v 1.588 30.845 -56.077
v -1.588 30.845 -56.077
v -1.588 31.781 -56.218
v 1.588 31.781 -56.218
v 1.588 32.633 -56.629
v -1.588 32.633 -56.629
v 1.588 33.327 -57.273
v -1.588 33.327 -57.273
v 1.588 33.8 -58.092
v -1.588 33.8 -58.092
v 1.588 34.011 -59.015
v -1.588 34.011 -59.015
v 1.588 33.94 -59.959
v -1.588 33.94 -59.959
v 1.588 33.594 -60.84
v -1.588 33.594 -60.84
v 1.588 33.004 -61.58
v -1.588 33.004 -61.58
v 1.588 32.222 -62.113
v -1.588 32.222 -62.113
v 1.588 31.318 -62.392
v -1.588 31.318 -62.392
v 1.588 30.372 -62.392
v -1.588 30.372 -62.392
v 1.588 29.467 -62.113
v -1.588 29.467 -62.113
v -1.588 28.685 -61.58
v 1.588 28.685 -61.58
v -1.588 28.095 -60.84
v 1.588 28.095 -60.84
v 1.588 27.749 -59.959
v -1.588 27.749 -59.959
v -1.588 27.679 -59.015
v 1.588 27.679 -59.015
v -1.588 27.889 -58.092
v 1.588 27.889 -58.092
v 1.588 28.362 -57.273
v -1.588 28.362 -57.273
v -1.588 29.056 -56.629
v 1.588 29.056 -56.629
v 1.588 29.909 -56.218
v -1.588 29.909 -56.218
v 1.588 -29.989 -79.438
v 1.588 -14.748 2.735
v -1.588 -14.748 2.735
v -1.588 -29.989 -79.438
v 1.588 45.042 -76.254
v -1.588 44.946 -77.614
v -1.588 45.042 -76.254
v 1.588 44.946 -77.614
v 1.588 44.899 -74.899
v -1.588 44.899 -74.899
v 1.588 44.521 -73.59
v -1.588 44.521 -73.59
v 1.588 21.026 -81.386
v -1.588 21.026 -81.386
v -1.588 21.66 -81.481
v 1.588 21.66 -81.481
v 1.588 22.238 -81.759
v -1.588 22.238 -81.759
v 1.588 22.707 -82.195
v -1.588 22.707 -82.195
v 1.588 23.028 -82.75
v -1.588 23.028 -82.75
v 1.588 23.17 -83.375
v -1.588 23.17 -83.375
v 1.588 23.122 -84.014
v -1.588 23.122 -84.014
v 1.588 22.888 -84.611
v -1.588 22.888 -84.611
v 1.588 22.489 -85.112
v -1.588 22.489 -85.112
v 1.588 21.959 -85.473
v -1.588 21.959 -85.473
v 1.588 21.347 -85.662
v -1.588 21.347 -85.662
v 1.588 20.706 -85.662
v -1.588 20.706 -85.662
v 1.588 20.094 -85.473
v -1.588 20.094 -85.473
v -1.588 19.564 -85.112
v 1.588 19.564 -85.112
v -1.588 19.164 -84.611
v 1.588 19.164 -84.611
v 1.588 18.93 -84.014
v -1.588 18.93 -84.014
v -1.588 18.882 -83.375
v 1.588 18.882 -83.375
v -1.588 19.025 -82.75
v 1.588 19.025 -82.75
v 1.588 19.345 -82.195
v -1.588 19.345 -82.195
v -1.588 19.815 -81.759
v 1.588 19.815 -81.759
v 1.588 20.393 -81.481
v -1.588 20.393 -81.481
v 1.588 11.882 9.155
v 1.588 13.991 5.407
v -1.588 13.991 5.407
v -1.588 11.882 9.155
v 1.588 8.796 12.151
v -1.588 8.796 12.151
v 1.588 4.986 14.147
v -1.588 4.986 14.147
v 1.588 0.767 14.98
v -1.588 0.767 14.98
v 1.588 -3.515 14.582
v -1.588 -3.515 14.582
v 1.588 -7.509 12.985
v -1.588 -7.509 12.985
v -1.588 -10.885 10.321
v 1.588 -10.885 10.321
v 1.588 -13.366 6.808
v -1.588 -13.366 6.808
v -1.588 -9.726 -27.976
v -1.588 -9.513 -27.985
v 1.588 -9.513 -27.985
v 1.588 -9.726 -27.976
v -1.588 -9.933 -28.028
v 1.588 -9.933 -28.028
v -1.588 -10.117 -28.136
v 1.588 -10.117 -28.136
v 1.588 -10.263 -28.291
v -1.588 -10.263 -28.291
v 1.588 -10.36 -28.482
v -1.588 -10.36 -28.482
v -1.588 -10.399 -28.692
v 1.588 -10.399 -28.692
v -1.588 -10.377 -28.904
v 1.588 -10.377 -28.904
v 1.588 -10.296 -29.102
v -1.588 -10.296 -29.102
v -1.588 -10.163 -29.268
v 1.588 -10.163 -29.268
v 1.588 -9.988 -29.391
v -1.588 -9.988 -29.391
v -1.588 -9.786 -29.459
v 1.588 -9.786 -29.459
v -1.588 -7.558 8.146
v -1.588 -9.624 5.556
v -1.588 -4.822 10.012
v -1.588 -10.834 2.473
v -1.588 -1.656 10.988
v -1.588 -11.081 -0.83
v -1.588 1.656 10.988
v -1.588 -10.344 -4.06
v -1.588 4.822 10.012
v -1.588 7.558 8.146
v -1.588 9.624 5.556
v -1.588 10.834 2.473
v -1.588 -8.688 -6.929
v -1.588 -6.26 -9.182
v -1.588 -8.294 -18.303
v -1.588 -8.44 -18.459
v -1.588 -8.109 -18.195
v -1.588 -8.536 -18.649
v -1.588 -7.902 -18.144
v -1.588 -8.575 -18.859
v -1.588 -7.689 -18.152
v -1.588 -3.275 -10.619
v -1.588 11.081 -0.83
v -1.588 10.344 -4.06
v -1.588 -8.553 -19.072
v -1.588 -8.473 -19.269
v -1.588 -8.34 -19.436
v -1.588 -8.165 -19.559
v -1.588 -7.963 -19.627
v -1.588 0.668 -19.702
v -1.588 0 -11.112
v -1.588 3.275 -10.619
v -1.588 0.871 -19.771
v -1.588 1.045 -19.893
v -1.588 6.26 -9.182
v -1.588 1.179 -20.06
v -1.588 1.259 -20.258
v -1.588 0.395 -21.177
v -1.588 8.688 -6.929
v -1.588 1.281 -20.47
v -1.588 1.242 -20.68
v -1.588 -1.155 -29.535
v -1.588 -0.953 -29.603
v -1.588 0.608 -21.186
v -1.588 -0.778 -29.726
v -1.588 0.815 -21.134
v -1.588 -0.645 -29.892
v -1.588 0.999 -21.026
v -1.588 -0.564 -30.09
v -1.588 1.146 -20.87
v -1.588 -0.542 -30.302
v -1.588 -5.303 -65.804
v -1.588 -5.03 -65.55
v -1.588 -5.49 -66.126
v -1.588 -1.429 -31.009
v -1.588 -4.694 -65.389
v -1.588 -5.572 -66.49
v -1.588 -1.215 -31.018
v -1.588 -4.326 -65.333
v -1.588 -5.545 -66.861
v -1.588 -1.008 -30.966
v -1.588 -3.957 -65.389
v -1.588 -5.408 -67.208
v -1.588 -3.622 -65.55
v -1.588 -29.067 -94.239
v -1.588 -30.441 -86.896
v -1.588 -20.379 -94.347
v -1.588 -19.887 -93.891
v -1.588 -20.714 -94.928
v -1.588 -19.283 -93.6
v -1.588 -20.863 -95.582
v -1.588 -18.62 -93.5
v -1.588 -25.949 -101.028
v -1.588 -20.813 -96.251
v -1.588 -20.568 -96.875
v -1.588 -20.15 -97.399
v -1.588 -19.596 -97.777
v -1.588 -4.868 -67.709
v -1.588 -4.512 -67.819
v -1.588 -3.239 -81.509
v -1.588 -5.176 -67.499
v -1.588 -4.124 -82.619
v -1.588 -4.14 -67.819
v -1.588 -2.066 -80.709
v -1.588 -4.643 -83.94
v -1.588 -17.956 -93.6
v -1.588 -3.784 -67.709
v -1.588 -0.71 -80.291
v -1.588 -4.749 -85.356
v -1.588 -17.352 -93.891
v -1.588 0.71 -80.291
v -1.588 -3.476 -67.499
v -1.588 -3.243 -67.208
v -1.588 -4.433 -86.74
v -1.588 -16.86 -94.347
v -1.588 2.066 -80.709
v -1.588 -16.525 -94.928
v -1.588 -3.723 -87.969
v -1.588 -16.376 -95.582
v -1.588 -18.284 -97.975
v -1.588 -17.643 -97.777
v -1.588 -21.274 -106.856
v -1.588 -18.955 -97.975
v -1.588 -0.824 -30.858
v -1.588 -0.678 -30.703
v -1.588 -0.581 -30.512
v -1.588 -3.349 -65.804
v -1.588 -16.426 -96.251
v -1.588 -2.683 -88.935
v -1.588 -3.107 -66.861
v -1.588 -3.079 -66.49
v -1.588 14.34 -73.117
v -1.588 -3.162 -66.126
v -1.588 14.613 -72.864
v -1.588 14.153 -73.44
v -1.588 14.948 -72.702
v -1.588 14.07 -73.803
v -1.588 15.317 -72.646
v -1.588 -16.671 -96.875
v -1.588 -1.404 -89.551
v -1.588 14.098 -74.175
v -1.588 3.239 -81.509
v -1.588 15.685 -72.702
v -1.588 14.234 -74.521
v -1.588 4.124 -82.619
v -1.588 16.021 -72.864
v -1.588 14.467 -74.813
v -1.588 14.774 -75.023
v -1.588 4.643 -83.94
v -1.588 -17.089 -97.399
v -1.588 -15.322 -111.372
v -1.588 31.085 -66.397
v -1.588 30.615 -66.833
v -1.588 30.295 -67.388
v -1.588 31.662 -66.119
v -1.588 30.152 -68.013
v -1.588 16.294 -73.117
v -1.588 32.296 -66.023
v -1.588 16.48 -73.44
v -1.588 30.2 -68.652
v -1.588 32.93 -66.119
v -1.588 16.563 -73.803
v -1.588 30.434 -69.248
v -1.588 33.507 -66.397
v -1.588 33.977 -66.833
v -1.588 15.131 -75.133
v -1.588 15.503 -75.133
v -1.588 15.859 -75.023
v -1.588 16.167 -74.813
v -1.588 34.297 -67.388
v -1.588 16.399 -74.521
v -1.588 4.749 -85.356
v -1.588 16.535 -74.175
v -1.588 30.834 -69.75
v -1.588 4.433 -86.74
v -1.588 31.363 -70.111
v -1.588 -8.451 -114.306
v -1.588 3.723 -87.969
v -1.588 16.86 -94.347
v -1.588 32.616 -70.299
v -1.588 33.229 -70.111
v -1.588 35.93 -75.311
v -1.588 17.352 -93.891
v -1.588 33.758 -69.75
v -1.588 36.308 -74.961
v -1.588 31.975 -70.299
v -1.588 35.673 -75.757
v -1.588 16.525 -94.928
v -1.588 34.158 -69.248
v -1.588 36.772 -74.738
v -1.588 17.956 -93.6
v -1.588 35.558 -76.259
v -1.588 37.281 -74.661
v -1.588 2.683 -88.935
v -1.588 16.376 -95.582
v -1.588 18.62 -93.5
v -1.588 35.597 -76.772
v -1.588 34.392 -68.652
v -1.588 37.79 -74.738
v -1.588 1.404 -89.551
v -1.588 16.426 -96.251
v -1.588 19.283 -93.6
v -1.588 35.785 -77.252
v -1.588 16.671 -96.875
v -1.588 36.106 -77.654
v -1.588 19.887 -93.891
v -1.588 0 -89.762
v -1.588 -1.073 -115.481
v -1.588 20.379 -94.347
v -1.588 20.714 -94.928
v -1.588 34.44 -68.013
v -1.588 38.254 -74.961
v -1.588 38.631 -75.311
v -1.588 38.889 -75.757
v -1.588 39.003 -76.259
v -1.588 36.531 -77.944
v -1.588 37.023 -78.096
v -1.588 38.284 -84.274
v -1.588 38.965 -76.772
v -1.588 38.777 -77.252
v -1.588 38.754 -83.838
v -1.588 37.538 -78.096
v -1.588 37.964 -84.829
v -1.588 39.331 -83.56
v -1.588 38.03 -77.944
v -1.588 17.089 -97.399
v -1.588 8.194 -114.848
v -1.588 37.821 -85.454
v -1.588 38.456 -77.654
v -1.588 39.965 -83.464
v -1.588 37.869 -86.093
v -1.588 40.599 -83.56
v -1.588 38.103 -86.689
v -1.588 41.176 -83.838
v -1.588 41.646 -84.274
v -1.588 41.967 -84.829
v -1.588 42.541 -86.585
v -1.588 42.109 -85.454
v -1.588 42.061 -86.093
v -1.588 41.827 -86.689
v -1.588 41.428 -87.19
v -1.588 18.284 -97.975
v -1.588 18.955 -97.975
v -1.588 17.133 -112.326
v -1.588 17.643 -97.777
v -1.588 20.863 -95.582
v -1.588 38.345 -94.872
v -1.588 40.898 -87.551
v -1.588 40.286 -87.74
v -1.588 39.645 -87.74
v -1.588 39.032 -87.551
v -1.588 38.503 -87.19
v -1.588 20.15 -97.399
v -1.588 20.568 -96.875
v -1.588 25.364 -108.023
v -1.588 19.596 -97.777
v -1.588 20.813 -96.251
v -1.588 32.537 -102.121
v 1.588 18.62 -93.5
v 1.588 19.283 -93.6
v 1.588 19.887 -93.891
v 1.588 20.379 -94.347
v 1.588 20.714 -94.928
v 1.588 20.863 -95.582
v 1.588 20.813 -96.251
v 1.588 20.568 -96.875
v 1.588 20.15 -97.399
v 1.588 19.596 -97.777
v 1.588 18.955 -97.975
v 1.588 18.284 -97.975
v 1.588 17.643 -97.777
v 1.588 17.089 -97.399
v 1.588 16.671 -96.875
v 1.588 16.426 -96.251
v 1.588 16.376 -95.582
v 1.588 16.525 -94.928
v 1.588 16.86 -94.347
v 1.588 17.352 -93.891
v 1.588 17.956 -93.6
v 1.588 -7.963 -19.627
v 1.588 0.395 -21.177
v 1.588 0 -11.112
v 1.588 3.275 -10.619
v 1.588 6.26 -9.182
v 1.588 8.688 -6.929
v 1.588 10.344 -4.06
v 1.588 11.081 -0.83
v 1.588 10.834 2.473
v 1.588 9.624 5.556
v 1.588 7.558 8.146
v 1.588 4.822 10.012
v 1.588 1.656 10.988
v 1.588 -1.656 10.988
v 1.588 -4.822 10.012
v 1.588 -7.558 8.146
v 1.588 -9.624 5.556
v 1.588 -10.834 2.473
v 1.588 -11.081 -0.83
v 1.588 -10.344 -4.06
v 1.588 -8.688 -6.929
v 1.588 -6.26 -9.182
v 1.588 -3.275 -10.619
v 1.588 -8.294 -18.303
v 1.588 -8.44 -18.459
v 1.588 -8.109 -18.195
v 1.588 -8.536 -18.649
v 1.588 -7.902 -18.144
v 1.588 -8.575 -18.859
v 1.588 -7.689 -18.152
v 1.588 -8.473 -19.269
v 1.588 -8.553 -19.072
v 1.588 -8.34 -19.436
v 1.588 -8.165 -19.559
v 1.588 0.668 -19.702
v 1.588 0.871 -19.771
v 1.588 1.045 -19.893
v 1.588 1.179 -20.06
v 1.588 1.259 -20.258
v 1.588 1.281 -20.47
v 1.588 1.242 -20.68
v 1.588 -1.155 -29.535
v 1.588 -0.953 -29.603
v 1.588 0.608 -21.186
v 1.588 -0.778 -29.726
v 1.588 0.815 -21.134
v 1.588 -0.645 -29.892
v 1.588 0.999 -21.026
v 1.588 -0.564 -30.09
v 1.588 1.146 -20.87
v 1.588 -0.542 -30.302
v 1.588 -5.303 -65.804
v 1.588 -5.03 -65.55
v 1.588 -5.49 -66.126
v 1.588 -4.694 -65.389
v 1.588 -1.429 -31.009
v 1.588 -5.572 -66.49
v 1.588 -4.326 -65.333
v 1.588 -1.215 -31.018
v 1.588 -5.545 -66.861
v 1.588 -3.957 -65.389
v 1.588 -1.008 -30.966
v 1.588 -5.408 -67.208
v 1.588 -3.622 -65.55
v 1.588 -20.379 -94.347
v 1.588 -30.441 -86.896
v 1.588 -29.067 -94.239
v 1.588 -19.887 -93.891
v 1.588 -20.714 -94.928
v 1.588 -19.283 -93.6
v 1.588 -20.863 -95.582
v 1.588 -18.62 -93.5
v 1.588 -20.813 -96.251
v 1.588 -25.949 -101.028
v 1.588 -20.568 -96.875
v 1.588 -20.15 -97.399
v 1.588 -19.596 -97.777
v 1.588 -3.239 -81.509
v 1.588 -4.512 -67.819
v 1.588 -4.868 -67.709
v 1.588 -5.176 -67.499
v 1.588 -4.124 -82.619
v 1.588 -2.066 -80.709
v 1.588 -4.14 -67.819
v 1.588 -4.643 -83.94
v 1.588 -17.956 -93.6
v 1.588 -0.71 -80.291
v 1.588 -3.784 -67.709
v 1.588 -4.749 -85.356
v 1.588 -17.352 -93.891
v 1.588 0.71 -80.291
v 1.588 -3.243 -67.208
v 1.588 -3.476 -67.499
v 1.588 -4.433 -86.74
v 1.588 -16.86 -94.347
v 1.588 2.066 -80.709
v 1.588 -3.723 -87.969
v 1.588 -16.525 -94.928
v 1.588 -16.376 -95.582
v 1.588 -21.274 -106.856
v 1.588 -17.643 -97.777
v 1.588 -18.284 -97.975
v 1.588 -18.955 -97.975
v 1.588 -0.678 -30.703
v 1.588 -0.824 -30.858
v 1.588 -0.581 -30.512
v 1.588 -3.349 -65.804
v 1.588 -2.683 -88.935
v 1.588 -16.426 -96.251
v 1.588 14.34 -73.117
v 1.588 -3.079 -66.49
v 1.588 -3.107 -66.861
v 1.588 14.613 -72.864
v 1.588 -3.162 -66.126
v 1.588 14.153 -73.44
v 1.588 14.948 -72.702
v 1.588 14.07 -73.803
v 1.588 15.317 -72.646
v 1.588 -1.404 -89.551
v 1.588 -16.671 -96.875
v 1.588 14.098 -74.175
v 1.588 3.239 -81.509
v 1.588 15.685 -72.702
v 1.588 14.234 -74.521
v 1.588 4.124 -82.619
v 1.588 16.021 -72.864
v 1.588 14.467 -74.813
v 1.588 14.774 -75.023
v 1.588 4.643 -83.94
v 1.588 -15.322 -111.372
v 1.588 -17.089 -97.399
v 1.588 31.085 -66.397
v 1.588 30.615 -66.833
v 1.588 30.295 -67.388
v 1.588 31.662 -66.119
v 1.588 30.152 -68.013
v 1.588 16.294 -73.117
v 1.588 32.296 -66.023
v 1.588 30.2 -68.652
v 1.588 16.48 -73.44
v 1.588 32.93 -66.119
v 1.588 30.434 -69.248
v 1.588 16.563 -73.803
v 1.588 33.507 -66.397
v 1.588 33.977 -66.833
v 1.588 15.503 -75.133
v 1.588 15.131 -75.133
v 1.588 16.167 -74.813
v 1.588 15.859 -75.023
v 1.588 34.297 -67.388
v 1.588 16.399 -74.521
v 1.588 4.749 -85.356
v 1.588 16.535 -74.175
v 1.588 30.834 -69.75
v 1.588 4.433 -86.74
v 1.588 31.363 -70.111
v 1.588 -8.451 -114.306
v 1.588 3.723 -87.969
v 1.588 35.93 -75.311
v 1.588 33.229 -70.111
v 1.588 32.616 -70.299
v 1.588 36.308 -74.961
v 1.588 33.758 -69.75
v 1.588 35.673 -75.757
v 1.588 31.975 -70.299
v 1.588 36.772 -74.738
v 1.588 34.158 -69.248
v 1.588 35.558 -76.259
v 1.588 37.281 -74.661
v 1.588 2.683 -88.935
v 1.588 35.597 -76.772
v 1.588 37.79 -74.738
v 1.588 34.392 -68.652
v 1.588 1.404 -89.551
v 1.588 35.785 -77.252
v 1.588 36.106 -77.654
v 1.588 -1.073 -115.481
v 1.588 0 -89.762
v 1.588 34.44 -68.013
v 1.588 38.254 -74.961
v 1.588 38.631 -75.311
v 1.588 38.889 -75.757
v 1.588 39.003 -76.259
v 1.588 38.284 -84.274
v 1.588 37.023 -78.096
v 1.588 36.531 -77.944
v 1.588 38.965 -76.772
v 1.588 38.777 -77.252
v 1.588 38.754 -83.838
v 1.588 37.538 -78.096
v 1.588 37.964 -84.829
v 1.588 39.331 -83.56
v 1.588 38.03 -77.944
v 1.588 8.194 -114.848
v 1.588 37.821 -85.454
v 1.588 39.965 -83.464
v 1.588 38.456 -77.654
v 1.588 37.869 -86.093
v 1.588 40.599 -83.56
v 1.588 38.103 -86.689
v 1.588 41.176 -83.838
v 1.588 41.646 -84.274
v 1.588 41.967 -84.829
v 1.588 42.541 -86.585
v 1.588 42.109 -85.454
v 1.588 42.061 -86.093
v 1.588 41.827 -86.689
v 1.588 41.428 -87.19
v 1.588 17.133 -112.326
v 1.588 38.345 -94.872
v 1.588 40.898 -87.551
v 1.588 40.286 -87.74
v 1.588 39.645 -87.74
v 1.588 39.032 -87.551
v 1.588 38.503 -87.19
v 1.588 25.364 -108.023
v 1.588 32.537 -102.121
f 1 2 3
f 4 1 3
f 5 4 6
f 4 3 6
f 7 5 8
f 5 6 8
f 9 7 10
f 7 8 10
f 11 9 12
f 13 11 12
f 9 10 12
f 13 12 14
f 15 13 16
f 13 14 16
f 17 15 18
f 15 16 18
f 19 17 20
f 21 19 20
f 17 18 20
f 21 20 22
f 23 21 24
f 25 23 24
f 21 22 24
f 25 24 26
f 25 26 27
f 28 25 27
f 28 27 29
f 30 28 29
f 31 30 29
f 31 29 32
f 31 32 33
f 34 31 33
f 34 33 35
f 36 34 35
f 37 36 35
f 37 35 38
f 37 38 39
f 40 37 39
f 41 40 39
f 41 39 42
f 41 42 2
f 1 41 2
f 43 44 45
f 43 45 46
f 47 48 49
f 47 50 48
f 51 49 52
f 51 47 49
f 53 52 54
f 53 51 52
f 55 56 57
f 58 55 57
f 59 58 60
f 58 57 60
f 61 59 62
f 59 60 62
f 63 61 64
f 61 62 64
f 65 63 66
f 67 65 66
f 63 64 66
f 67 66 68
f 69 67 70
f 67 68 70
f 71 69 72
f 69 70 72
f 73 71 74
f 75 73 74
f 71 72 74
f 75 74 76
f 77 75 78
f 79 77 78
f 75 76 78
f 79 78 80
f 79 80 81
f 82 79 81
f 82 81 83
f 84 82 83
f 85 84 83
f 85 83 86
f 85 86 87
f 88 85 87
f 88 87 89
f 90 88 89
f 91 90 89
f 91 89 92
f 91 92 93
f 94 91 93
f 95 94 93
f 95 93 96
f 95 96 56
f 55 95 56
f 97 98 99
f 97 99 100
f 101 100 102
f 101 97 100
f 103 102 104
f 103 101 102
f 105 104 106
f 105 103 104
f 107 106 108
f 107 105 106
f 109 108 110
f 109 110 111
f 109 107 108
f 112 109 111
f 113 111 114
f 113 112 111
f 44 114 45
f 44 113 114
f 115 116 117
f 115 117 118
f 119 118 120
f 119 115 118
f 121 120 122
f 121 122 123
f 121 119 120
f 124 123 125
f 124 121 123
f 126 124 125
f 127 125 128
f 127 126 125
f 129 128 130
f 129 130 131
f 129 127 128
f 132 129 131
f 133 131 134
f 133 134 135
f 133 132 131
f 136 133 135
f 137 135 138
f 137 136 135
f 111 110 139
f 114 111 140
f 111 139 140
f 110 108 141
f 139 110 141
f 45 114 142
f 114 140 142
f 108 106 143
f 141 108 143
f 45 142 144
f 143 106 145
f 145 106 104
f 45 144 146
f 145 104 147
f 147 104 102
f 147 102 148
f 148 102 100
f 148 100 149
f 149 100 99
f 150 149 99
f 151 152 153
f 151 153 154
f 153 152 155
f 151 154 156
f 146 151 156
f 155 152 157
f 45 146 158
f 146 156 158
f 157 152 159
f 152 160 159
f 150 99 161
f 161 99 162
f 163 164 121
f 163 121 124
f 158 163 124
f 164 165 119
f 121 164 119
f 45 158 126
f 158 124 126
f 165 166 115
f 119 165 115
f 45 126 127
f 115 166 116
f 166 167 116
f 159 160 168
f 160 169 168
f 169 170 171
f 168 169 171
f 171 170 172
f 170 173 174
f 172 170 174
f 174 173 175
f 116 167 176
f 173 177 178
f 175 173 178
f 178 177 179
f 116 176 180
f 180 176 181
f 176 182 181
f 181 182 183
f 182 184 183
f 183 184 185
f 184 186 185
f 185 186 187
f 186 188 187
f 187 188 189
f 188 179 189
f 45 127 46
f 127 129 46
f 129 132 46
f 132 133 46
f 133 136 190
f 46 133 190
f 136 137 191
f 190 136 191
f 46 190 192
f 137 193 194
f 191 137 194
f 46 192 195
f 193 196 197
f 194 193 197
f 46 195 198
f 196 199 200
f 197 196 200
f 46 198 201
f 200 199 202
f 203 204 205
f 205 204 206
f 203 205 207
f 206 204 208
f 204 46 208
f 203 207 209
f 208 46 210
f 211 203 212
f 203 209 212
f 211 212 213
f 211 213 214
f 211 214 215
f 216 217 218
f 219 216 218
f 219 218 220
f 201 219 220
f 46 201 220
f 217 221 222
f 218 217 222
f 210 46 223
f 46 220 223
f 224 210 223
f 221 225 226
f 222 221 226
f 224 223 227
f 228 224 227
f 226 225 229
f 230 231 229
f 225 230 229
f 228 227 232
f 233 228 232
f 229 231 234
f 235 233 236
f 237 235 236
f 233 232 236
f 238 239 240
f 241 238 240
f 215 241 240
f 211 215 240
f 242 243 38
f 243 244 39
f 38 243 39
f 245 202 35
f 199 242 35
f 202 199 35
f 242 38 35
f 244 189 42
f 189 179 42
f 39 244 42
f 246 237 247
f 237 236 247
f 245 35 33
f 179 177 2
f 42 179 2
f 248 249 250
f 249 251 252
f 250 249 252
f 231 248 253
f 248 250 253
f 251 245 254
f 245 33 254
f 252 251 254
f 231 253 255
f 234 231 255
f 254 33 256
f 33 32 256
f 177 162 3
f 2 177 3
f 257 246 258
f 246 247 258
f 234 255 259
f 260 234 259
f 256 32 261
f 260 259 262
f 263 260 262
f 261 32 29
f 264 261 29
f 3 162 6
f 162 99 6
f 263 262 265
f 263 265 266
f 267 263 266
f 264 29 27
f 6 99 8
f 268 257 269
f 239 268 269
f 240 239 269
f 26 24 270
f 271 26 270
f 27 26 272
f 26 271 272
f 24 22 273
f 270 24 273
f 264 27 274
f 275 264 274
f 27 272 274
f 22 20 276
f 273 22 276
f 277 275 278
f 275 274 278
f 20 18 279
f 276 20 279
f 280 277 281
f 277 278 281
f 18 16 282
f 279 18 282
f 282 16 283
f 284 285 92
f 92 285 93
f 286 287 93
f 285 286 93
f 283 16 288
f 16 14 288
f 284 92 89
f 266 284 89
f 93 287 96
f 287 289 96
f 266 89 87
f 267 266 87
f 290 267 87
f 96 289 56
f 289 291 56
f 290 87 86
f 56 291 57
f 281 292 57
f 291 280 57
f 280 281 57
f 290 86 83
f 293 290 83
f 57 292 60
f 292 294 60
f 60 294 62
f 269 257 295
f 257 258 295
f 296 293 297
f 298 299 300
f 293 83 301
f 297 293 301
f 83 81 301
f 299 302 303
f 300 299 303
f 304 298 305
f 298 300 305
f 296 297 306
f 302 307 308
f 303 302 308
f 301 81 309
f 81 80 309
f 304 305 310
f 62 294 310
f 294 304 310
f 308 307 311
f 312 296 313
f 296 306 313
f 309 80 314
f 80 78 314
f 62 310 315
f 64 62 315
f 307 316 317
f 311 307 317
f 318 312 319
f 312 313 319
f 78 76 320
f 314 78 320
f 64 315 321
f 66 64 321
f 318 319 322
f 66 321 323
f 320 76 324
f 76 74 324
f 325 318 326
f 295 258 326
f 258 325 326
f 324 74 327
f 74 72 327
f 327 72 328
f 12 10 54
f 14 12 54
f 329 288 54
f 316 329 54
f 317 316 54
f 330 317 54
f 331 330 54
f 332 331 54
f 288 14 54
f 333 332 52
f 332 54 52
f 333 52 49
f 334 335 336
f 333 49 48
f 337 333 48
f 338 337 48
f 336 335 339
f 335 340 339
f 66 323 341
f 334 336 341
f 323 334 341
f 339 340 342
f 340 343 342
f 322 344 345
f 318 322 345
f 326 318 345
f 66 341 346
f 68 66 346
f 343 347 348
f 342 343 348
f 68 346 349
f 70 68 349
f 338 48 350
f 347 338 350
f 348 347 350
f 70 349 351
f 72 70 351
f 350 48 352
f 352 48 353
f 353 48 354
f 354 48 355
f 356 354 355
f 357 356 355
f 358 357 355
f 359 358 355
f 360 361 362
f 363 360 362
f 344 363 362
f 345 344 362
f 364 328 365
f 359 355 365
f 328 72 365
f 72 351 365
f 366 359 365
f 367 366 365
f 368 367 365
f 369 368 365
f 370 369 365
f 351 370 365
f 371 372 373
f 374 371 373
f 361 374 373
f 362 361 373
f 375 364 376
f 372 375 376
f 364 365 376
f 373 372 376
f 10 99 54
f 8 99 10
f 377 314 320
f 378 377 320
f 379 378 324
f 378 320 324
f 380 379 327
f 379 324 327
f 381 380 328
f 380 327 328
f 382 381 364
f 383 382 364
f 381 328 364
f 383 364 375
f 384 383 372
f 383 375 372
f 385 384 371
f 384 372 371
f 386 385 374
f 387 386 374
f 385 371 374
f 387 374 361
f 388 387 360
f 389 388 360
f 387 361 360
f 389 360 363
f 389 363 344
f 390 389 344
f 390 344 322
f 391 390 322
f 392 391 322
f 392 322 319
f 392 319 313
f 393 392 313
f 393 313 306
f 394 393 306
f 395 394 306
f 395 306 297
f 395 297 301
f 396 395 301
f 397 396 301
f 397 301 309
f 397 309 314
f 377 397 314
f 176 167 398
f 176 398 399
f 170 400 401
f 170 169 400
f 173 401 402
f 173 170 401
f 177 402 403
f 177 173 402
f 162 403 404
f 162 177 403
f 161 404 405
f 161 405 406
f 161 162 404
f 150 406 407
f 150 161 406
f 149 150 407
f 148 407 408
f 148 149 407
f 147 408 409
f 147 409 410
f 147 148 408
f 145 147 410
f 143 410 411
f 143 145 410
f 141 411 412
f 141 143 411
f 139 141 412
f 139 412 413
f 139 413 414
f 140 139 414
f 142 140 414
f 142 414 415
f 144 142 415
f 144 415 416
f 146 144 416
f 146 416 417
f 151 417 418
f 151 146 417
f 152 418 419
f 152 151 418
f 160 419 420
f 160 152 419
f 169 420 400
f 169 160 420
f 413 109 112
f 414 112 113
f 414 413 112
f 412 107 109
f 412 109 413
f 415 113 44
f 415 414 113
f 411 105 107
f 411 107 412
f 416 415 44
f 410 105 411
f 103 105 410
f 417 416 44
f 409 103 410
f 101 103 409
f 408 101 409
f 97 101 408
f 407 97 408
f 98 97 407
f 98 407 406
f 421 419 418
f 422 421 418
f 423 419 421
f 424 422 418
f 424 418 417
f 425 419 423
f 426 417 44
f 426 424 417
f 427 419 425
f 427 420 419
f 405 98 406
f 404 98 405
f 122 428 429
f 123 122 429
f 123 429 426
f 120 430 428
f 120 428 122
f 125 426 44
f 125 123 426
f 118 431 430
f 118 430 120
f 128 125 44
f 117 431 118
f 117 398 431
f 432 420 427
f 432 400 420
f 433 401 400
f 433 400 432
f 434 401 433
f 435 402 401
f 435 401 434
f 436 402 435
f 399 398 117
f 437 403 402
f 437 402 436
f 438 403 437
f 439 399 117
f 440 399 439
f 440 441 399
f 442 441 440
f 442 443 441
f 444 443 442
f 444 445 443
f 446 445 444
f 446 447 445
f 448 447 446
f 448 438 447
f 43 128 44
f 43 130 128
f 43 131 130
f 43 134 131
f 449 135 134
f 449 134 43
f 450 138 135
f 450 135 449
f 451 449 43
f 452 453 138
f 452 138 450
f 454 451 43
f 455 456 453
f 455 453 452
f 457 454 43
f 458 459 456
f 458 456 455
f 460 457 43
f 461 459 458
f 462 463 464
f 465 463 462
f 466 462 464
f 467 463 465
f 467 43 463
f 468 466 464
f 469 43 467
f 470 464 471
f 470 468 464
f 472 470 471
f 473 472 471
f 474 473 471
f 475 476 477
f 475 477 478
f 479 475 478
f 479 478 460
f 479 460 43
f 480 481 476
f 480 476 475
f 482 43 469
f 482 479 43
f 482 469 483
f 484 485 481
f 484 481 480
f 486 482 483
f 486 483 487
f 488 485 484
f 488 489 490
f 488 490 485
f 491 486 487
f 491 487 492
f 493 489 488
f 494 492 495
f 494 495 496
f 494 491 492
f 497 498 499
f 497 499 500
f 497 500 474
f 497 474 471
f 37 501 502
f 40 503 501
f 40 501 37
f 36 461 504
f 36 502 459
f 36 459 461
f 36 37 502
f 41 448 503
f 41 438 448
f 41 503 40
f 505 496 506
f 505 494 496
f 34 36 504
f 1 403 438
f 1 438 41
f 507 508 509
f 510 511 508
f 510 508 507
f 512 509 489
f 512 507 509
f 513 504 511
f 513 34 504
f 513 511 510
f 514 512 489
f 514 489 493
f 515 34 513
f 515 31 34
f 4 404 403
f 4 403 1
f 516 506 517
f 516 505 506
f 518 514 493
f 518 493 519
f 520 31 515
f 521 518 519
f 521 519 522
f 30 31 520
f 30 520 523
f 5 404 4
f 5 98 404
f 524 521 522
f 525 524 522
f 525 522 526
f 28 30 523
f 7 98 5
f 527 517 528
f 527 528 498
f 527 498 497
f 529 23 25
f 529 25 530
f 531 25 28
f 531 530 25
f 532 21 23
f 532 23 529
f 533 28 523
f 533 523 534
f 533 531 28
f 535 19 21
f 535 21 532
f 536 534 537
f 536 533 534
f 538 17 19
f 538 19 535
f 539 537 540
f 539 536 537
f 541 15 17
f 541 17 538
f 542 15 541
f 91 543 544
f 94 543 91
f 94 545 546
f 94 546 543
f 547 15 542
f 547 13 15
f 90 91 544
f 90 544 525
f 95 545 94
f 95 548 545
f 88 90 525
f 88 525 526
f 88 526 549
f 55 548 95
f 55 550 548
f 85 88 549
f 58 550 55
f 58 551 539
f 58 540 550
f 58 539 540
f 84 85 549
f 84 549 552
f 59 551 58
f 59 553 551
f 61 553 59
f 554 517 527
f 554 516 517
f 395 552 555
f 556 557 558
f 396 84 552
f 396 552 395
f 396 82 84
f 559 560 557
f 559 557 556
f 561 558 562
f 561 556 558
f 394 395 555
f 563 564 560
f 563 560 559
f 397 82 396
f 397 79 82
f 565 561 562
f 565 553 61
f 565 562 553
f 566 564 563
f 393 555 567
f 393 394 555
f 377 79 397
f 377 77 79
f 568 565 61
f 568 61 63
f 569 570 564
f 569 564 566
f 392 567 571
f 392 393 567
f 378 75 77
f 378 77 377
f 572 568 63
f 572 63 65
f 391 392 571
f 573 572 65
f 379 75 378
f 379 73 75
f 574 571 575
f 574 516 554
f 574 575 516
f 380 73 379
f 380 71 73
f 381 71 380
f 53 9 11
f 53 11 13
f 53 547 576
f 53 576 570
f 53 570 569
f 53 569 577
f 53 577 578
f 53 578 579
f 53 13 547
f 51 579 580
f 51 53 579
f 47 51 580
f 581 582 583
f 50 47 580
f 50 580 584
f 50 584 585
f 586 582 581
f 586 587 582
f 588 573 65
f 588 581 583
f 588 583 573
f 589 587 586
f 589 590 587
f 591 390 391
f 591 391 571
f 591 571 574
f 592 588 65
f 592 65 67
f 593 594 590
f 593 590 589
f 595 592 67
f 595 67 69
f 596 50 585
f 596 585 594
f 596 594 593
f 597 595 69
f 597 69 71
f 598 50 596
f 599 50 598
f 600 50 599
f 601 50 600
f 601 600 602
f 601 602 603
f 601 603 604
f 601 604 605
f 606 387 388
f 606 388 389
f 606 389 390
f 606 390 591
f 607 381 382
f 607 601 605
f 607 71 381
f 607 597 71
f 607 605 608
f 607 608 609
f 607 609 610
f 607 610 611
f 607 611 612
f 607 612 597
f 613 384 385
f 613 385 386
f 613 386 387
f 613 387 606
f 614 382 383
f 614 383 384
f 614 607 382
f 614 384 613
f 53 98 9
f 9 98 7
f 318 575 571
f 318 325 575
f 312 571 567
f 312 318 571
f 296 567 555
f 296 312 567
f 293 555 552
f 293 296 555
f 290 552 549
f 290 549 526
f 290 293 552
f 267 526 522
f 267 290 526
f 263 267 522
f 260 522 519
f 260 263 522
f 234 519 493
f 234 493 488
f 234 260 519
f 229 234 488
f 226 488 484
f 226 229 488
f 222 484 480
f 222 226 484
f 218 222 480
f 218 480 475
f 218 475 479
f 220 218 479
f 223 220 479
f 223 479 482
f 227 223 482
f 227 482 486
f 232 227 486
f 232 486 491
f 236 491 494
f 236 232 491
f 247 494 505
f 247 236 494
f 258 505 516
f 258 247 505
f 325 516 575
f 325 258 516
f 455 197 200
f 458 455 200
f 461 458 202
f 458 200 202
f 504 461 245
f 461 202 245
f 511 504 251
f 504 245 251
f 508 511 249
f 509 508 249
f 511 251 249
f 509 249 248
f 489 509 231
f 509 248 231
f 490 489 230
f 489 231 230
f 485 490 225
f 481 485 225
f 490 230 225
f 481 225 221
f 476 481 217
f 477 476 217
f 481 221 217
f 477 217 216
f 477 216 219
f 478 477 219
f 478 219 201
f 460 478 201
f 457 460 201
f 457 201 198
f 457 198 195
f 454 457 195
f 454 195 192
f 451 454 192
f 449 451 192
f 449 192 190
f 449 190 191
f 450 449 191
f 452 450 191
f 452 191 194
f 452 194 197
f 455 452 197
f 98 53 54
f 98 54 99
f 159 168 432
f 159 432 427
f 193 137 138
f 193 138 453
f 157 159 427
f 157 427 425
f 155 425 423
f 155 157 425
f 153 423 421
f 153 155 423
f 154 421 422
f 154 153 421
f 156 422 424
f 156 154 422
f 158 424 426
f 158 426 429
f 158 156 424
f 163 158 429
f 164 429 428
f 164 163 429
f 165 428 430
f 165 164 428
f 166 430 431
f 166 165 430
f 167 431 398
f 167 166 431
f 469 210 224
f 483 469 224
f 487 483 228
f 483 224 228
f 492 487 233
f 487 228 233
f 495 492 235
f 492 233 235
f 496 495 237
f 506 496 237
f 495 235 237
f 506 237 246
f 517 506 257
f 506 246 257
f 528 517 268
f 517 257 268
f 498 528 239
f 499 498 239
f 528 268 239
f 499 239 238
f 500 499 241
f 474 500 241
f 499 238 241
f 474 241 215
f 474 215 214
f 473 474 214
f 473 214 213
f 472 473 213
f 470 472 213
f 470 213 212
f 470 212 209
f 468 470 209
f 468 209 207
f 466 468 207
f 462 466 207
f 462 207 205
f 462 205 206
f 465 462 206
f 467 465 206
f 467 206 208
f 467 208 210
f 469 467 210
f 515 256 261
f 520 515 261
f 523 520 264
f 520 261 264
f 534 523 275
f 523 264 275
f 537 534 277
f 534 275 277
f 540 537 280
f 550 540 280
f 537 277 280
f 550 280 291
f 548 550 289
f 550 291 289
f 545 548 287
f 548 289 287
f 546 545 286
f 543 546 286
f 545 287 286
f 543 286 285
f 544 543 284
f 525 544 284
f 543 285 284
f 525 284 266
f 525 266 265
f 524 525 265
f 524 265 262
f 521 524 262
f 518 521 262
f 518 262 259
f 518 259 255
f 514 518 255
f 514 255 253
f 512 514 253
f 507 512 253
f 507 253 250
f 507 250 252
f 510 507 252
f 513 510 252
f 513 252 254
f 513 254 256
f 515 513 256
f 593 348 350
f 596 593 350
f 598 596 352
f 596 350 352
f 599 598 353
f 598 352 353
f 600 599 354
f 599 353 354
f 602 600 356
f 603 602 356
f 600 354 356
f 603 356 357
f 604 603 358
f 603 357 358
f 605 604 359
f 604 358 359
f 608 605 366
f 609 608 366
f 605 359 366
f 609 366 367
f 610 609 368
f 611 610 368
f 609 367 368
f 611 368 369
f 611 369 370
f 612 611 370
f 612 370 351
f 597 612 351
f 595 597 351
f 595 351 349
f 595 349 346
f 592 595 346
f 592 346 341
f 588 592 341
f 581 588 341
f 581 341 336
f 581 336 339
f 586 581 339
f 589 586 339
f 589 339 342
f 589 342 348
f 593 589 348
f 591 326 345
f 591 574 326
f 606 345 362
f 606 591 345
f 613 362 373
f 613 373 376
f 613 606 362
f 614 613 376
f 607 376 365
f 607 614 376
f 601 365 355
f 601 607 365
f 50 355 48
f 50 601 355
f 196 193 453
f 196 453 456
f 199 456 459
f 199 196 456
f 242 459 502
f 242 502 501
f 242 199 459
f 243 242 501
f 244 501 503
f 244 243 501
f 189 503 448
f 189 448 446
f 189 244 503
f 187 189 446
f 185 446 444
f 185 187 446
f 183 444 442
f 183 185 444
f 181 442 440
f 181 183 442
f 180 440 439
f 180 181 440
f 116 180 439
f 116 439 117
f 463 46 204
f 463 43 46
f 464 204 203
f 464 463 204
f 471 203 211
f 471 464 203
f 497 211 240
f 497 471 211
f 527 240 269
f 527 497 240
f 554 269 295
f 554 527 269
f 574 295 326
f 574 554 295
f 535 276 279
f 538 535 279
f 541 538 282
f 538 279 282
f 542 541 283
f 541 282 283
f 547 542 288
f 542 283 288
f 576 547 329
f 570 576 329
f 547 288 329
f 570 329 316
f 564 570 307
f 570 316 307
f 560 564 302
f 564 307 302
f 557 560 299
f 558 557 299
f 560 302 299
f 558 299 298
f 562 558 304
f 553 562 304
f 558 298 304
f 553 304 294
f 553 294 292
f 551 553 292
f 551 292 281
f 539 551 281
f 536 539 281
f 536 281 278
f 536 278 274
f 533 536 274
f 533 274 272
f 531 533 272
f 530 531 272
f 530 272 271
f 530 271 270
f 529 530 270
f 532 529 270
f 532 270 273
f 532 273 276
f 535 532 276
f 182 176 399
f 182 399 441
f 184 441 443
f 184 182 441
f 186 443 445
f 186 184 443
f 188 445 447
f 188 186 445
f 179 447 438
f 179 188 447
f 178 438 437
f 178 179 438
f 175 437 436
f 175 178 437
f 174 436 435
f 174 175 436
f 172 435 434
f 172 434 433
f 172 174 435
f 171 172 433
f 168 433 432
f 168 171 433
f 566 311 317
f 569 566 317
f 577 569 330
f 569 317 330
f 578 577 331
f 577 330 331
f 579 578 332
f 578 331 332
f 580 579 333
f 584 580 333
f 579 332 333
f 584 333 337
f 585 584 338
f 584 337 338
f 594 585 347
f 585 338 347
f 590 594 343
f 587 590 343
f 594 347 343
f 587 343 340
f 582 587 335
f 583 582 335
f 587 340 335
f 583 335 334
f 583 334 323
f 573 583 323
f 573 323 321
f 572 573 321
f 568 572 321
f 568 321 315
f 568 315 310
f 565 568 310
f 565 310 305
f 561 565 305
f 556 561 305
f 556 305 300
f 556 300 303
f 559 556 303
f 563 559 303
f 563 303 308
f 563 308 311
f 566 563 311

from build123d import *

# Parameters (mm, degrees)
SKETCH1_R                  = 11.1125
SKETCH1_R_2                = 4.7625
BOSS_EXTRUDE1_DEPTH        = 1.5875
M3X0_5_TAPPED_HOLE1_D      = 2.5
M4_CLEARANCE_HOLE1_D       = 4.5
F_8_32_TAPPED_HOLE1_D      = 3.4544
F_1_4_0_2500_DOWEL_HOLE1_D = 6.35
F_1_5MM_START              = -1.5875
F_1_5MM_DOWEL_SLOT1_DEPTH  = 3.175
M4_CLEARANCE_HOLE2_D       = 4.3


# Read off the part's stored shape, not the designer's step: Ø1.5mm Dowel Slot1
with BuildPart() as part:
    # Sketch1 → Boss-Extrude1 (new, symmetric)
    with BuildSketch(Plane(origin=(0, 0, 0), x_dir=(0, 0, -1), z_dir=(1, 0, 0))):
        with BuildLine():
            ThreePointArc((77.61368545, 44.94589464), (75.573628084, 45.000402813), (73.589867092, 44.521343816))
            Line((73.589867092, 44.521343816), (-5.407259882, 13.991481))
            ThreePointArc((-5.407259882, 13.991481), (-14.935591096, -1.388567103), (-2.735294118, -14.748497079))
            Line((-2.735294118, -14.748497079), (79.438235294, -29.988610727))
            ThreePointArc((79.438235294, -29.988610727), (104.085761469, -23.790412126), (115.481107121, -1.073363244))
            ThreePointArc((115.481107121, -1.073363244), (105.257248721, 29.103257737), (77.61368545, 44.94589464))
        make_face()
        Circle(SKETCH1_R, mode=Mode.SUBTRACT)
        with Locations((85, 0)):
            Circle(SKETCH1_R_2, mode=Mode.SUBTRACT)
    extrude(amount=BOSS_EXTRUDE1_DEPTH, both=True)

    # M3x0.5 Tapped Hole1 (through all)
    with Locations(Plane(origin=(1.5875, 0, 0), x_dir=(0, 0, -1), z_dir=(1, 0, 0))):
        with Locations((66.583175665, -4.32590816), (73.896496396, 15.316824335)):
            Hole(M3X0_5_TAPPED_HOLE1_D / 2)

    # M4 Clearance Hole1 (through all)
    with Locations(Plane(origin=(1.5875, 0, 0), x_dir=(0, 0, -1), z_dir=(1, 0, 0))):
        with Locations((95.75, 18.619546181), (95.75, -18.619546181)):
            Hole(M4_CLEARANCE_HOLE1_D / 2)

    # #8-32 Tapped Hole1 (through all)
    with Locations(Plane(origin=(1.5875, 0, 0), x_dir=(0, 0, -1), z_dir=(1, 0, 0))):
        with Locations((76.388124081, 37.280752399)):
            Hole(F_8_32_TAPPED_HOLE1_D / 2)

    # 1/4 (0.2500) Dowel Hole1 (through all)
    with Locations(Plane(origin=(1.5875, 0, 0), x_dir=(0, 0, -1), z_dir=(1, 0, 0))):
        with Locations((59.252323656, 30.844807364)):
            Hole(F_1_4_0_2500_DOWEL_HOLE1_D / 2)

    # Ø1.5mm Dowel Slot1 outline → Ø1.5mm Dowel Slot1 (cut)
    with BuildSketch(Plane.YZ.offset(F_1_5MM_START)):
        with BuildLine():
            Line((-1.15508269, -29.534569304), (-9.512564368, -27.984569304))
            ThreePointArc((-9.512564368, -27.984569304), (-10.386753928, -28.585229452), (-9.78609378, -29.459419012))
            Line((-9.78609378, -29.459419012), (-1.428612102, -31.009419012))
            ThreePointArc((-1.428612102, -31.009419012), (-0.554422542, -30.408758864), (-1.15508269, -29.534569304))
        make_face()
        with BuildLine():
            Line((0.668446721, -19.702237918), (-7.689034957, -18.152237918))
            ThreePointArc((-7.689034957, -18.152237918), (-8.563224517, -18.752898066), (-7.962564368, -19.627087626))
            Line((-7.962564368, -19.627087626), (0.39491731, -21.177087626))
            ThreePointArc((0.39491731, -21.177087626), (1.269106869, -20.576427477), (0.668446721, -19.702237918))
        make_face()
    extrude(amount=F_1_5MM_DOWEL_SLOT1_DEPTH, mode=Mode.SUBTRACT)

    # M4 Clearance Hole2 (through all)
    with Locations(Plane(origin=(1.5875, 0, 0), x_dir=(0, 0, -1), z_dir=(1, 0, 0))):
        with Locations((68.173492099, 32.295918862), (85.614306674, 39.965207417), (83.535698104, 21.026374654)):
            Hole(M4_CLEARANCE_HOLE2_D / 2)


solid = part.part
